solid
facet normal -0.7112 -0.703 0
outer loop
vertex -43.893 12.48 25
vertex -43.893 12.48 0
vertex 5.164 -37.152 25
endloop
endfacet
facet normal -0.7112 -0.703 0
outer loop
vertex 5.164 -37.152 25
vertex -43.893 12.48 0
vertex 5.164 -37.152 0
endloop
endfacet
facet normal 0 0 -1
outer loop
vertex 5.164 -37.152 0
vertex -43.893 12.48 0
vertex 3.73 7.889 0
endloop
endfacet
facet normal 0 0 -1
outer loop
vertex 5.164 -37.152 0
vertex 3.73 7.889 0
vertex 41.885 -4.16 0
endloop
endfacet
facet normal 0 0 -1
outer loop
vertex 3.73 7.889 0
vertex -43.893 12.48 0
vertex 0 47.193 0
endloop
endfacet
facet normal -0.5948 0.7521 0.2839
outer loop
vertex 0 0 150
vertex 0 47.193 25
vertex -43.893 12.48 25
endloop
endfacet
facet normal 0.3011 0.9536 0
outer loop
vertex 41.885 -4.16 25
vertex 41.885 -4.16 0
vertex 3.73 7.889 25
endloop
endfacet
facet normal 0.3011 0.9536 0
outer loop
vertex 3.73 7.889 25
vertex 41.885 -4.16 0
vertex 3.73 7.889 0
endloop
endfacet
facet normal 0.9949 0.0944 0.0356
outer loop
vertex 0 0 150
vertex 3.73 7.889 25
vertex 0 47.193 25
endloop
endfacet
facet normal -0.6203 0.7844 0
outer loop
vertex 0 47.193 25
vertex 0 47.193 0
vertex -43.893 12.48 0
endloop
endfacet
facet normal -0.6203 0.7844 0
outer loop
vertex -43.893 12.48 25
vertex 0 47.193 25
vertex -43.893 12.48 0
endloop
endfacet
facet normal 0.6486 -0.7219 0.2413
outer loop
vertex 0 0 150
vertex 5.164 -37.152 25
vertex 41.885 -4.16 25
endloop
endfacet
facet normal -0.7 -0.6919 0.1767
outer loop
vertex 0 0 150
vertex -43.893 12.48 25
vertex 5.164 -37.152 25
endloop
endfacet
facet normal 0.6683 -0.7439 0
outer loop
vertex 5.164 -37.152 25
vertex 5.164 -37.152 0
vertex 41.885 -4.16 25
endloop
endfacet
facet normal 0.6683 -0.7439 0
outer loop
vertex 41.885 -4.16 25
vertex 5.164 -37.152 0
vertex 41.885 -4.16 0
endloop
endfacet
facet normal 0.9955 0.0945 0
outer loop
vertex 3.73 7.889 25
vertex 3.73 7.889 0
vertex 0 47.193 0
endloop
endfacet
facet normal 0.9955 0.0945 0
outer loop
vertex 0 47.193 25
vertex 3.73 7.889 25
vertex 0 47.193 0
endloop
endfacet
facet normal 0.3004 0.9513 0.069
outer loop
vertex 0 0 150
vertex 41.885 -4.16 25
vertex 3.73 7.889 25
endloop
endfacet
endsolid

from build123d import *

# Parameters (mm, degrees)
F1_DEPTH = 25


with BuildPart() as f1:
    # F0 (on Top) → F1 (new body)
    with BuildSketch(Plane.XY):
        Polygon((3.729509, 7.889344), (0, 47.192626), (-43.893445, 12.479508), (5.163935, -37.151642), (41.885249, -4.159836), align=None)
    extrude(amount=F1_DEPTH)

    # F1_face (on face) → F4 section 0
    with BuildSketch(Plane(origin=(-3.684593, 1.905517, 25), x_dir=(1, 0, 0), z_dir=(0, 0, 1)), mode=Mode.PRIVATE) as f4_s0:
        Polygon((45.569842, -6.065353), (7.414102, 5.983827), (3.684593, 45.287109), (-40.208852, 10.573991), (8.848528, -39.057159), align=None)
    loft([f4_s0.sketch, Vertex(0, 0, 150)])


solid = f1.part
